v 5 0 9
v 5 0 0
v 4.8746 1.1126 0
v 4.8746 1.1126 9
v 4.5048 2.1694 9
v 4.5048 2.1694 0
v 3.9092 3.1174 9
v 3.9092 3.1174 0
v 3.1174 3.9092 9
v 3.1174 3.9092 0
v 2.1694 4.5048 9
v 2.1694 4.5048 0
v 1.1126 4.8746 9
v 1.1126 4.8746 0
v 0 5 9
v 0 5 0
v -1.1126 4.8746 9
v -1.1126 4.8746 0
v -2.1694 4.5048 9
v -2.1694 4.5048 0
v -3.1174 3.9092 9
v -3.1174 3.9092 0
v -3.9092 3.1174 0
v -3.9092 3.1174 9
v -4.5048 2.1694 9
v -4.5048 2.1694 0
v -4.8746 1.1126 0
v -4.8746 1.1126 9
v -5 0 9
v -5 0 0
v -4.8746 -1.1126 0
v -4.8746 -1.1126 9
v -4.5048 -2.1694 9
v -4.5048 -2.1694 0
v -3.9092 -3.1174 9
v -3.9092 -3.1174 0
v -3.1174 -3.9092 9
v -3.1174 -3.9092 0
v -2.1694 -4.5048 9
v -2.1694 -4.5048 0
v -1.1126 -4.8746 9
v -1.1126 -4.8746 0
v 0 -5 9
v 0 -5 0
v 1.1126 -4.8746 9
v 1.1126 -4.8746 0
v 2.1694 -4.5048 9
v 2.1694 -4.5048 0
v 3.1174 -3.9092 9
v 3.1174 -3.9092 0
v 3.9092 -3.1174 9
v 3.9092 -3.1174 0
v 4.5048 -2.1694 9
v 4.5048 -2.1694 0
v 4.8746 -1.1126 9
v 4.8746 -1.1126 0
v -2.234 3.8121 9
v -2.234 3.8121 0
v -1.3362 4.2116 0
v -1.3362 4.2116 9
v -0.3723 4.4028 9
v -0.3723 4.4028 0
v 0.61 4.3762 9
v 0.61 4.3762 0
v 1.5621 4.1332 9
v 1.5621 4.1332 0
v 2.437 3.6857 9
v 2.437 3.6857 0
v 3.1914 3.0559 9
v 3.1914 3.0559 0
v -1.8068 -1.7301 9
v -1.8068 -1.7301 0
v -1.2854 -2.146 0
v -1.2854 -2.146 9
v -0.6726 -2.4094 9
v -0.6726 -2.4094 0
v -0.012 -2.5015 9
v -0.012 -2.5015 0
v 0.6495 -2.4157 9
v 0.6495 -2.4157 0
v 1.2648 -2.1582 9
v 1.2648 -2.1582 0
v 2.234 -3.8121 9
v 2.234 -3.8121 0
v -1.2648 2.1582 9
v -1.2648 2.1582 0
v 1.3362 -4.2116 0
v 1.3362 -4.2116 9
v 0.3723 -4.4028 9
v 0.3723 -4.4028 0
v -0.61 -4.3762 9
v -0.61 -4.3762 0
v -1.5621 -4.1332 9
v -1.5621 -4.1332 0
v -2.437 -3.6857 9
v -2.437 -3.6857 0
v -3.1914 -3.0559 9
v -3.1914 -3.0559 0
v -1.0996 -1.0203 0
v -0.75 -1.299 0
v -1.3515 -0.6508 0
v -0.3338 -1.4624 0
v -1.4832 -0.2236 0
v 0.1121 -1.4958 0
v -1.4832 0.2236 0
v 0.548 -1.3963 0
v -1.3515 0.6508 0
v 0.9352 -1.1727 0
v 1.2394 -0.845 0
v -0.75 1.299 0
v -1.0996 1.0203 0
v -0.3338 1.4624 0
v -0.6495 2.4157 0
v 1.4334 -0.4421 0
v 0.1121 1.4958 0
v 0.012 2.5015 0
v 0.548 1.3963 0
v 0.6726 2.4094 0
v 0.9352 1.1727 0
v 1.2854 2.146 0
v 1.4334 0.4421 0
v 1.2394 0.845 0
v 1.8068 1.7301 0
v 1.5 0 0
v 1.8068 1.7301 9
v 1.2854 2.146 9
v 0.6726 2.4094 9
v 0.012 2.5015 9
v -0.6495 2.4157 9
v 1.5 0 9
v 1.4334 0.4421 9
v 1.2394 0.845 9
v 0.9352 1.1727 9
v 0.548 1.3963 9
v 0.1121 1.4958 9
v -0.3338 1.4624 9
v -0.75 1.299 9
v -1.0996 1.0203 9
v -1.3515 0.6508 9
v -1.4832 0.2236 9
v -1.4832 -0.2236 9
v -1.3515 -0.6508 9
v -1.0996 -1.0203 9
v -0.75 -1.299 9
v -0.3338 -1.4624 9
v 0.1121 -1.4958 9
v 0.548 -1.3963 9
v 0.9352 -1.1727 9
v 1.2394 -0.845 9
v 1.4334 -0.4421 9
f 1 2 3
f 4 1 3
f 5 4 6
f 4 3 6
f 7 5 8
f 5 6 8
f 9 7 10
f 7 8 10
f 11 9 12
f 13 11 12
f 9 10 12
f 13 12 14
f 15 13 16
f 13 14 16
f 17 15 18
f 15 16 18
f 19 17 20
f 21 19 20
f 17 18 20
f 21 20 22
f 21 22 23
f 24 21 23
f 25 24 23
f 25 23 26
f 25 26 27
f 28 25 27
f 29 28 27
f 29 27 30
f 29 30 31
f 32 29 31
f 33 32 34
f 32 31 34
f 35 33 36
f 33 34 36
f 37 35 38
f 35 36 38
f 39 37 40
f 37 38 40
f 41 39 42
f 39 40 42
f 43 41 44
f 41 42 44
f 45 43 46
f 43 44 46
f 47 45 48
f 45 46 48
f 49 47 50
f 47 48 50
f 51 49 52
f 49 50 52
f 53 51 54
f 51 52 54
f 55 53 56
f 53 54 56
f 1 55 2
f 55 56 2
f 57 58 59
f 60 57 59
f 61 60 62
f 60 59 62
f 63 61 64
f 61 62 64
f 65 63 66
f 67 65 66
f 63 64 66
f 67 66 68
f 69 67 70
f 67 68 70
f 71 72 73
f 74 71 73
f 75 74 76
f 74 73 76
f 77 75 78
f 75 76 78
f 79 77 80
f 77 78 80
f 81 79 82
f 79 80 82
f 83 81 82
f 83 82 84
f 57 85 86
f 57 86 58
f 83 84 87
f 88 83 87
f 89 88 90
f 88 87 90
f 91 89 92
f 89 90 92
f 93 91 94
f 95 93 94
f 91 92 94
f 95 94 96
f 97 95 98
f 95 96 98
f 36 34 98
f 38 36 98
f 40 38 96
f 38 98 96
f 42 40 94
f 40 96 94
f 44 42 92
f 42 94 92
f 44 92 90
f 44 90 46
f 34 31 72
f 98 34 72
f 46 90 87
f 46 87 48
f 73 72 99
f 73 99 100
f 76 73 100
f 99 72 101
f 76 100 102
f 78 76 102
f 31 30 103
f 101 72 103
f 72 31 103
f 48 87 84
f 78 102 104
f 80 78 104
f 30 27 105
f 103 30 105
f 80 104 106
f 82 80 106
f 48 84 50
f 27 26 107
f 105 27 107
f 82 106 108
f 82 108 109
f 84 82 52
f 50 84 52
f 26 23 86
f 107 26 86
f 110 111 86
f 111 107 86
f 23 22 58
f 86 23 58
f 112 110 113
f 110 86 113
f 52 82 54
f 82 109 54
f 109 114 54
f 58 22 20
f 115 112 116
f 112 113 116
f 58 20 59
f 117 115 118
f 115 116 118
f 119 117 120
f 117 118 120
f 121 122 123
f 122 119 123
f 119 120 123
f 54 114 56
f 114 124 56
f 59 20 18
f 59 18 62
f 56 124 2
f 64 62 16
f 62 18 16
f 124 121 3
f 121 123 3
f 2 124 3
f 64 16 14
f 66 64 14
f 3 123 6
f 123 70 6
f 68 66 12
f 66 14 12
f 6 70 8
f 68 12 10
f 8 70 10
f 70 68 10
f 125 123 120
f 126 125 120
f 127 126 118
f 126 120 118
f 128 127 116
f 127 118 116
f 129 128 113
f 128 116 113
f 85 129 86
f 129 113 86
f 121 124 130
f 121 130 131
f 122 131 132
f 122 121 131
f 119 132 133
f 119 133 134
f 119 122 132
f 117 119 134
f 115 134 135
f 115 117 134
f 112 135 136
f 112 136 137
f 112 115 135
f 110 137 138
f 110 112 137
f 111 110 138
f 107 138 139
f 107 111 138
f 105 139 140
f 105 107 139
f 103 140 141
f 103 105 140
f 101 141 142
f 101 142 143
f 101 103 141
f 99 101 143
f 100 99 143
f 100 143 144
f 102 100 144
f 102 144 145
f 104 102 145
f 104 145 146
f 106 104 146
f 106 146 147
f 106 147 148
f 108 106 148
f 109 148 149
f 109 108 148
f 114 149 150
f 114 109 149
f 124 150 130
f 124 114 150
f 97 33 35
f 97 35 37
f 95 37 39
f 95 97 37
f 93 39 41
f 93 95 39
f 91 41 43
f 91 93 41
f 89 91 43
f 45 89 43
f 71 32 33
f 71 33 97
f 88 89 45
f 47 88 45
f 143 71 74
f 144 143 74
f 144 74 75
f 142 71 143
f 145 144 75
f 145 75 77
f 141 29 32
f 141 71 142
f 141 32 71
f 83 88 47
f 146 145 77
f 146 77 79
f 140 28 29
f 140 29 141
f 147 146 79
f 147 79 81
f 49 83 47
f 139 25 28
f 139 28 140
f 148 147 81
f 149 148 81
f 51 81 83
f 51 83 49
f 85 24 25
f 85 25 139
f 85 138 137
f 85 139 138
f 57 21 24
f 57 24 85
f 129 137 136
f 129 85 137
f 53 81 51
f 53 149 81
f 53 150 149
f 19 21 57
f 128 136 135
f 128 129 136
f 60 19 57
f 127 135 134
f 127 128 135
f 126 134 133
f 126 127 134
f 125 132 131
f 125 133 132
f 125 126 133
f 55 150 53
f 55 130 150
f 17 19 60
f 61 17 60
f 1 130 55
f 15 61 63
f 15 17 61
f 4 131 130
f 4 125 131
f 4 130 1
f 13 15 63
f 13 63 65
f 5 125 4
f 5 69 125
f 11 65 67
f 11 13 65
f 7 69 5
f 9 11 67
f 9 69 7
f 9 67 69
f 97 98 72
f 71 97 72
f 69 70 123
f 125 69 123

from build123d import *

# Parameters (mm, degrees)
F0_R     = 5
F0_R_2   = 1.5
F1_DEPTH = 9


# Not quite as in the source:
# - a feature names something its author has since deleted; it is built from what else it names


with BuildPart() as f1:
    # F0 (on Top) → F1 (new body)
    with BuildSketch(Plane.XY):
        Circle(F0_R)
        with BuildLine():
            ThreePointArc((-1.8067647919, -1.7300678361), (-0.3453428308, -2.4775536442), (1.2647834859, -2.1582067706))
            Line((1.2647834859, -2.1582067706), (2.2340463063, -3.8121416967))
            ThreePointArc((2.2340463063, -3.8121416967), (-0.6099952159, -4.3762190359), (-3.1913732702, -3.0558998452))
            Line((-3.1913732702, -3.0558998452), (-1.8067647919, -1.7300678361))
        make_face(mode=Mode.SUBTRACT)
        Circle(F0_R_2, mode=Mode.SUBTRACT)
        with BuildLine():
            ThreePointArc((-2.2340463063, 3.8121416967), (0.6099952159, 4.3762190359), (3.1913732702, 3.0558998452))
            Line((3.1913732702, 3.0558998452), (1.8067647919, 1.7300678361))
            ThreePointArc((1.8067647919, 1.7300678361), (0.3453428308, 2.4775536442), (-1.2647834859, 2.1582067706))
            Line((-1.2647834859, 2.1582067706), (-2.2340463063, 3.8121416967))
        make_face(mode=Mode.SUBTRACT)
    extrude(amount=F1_DEPTH)


solid = f1.part
